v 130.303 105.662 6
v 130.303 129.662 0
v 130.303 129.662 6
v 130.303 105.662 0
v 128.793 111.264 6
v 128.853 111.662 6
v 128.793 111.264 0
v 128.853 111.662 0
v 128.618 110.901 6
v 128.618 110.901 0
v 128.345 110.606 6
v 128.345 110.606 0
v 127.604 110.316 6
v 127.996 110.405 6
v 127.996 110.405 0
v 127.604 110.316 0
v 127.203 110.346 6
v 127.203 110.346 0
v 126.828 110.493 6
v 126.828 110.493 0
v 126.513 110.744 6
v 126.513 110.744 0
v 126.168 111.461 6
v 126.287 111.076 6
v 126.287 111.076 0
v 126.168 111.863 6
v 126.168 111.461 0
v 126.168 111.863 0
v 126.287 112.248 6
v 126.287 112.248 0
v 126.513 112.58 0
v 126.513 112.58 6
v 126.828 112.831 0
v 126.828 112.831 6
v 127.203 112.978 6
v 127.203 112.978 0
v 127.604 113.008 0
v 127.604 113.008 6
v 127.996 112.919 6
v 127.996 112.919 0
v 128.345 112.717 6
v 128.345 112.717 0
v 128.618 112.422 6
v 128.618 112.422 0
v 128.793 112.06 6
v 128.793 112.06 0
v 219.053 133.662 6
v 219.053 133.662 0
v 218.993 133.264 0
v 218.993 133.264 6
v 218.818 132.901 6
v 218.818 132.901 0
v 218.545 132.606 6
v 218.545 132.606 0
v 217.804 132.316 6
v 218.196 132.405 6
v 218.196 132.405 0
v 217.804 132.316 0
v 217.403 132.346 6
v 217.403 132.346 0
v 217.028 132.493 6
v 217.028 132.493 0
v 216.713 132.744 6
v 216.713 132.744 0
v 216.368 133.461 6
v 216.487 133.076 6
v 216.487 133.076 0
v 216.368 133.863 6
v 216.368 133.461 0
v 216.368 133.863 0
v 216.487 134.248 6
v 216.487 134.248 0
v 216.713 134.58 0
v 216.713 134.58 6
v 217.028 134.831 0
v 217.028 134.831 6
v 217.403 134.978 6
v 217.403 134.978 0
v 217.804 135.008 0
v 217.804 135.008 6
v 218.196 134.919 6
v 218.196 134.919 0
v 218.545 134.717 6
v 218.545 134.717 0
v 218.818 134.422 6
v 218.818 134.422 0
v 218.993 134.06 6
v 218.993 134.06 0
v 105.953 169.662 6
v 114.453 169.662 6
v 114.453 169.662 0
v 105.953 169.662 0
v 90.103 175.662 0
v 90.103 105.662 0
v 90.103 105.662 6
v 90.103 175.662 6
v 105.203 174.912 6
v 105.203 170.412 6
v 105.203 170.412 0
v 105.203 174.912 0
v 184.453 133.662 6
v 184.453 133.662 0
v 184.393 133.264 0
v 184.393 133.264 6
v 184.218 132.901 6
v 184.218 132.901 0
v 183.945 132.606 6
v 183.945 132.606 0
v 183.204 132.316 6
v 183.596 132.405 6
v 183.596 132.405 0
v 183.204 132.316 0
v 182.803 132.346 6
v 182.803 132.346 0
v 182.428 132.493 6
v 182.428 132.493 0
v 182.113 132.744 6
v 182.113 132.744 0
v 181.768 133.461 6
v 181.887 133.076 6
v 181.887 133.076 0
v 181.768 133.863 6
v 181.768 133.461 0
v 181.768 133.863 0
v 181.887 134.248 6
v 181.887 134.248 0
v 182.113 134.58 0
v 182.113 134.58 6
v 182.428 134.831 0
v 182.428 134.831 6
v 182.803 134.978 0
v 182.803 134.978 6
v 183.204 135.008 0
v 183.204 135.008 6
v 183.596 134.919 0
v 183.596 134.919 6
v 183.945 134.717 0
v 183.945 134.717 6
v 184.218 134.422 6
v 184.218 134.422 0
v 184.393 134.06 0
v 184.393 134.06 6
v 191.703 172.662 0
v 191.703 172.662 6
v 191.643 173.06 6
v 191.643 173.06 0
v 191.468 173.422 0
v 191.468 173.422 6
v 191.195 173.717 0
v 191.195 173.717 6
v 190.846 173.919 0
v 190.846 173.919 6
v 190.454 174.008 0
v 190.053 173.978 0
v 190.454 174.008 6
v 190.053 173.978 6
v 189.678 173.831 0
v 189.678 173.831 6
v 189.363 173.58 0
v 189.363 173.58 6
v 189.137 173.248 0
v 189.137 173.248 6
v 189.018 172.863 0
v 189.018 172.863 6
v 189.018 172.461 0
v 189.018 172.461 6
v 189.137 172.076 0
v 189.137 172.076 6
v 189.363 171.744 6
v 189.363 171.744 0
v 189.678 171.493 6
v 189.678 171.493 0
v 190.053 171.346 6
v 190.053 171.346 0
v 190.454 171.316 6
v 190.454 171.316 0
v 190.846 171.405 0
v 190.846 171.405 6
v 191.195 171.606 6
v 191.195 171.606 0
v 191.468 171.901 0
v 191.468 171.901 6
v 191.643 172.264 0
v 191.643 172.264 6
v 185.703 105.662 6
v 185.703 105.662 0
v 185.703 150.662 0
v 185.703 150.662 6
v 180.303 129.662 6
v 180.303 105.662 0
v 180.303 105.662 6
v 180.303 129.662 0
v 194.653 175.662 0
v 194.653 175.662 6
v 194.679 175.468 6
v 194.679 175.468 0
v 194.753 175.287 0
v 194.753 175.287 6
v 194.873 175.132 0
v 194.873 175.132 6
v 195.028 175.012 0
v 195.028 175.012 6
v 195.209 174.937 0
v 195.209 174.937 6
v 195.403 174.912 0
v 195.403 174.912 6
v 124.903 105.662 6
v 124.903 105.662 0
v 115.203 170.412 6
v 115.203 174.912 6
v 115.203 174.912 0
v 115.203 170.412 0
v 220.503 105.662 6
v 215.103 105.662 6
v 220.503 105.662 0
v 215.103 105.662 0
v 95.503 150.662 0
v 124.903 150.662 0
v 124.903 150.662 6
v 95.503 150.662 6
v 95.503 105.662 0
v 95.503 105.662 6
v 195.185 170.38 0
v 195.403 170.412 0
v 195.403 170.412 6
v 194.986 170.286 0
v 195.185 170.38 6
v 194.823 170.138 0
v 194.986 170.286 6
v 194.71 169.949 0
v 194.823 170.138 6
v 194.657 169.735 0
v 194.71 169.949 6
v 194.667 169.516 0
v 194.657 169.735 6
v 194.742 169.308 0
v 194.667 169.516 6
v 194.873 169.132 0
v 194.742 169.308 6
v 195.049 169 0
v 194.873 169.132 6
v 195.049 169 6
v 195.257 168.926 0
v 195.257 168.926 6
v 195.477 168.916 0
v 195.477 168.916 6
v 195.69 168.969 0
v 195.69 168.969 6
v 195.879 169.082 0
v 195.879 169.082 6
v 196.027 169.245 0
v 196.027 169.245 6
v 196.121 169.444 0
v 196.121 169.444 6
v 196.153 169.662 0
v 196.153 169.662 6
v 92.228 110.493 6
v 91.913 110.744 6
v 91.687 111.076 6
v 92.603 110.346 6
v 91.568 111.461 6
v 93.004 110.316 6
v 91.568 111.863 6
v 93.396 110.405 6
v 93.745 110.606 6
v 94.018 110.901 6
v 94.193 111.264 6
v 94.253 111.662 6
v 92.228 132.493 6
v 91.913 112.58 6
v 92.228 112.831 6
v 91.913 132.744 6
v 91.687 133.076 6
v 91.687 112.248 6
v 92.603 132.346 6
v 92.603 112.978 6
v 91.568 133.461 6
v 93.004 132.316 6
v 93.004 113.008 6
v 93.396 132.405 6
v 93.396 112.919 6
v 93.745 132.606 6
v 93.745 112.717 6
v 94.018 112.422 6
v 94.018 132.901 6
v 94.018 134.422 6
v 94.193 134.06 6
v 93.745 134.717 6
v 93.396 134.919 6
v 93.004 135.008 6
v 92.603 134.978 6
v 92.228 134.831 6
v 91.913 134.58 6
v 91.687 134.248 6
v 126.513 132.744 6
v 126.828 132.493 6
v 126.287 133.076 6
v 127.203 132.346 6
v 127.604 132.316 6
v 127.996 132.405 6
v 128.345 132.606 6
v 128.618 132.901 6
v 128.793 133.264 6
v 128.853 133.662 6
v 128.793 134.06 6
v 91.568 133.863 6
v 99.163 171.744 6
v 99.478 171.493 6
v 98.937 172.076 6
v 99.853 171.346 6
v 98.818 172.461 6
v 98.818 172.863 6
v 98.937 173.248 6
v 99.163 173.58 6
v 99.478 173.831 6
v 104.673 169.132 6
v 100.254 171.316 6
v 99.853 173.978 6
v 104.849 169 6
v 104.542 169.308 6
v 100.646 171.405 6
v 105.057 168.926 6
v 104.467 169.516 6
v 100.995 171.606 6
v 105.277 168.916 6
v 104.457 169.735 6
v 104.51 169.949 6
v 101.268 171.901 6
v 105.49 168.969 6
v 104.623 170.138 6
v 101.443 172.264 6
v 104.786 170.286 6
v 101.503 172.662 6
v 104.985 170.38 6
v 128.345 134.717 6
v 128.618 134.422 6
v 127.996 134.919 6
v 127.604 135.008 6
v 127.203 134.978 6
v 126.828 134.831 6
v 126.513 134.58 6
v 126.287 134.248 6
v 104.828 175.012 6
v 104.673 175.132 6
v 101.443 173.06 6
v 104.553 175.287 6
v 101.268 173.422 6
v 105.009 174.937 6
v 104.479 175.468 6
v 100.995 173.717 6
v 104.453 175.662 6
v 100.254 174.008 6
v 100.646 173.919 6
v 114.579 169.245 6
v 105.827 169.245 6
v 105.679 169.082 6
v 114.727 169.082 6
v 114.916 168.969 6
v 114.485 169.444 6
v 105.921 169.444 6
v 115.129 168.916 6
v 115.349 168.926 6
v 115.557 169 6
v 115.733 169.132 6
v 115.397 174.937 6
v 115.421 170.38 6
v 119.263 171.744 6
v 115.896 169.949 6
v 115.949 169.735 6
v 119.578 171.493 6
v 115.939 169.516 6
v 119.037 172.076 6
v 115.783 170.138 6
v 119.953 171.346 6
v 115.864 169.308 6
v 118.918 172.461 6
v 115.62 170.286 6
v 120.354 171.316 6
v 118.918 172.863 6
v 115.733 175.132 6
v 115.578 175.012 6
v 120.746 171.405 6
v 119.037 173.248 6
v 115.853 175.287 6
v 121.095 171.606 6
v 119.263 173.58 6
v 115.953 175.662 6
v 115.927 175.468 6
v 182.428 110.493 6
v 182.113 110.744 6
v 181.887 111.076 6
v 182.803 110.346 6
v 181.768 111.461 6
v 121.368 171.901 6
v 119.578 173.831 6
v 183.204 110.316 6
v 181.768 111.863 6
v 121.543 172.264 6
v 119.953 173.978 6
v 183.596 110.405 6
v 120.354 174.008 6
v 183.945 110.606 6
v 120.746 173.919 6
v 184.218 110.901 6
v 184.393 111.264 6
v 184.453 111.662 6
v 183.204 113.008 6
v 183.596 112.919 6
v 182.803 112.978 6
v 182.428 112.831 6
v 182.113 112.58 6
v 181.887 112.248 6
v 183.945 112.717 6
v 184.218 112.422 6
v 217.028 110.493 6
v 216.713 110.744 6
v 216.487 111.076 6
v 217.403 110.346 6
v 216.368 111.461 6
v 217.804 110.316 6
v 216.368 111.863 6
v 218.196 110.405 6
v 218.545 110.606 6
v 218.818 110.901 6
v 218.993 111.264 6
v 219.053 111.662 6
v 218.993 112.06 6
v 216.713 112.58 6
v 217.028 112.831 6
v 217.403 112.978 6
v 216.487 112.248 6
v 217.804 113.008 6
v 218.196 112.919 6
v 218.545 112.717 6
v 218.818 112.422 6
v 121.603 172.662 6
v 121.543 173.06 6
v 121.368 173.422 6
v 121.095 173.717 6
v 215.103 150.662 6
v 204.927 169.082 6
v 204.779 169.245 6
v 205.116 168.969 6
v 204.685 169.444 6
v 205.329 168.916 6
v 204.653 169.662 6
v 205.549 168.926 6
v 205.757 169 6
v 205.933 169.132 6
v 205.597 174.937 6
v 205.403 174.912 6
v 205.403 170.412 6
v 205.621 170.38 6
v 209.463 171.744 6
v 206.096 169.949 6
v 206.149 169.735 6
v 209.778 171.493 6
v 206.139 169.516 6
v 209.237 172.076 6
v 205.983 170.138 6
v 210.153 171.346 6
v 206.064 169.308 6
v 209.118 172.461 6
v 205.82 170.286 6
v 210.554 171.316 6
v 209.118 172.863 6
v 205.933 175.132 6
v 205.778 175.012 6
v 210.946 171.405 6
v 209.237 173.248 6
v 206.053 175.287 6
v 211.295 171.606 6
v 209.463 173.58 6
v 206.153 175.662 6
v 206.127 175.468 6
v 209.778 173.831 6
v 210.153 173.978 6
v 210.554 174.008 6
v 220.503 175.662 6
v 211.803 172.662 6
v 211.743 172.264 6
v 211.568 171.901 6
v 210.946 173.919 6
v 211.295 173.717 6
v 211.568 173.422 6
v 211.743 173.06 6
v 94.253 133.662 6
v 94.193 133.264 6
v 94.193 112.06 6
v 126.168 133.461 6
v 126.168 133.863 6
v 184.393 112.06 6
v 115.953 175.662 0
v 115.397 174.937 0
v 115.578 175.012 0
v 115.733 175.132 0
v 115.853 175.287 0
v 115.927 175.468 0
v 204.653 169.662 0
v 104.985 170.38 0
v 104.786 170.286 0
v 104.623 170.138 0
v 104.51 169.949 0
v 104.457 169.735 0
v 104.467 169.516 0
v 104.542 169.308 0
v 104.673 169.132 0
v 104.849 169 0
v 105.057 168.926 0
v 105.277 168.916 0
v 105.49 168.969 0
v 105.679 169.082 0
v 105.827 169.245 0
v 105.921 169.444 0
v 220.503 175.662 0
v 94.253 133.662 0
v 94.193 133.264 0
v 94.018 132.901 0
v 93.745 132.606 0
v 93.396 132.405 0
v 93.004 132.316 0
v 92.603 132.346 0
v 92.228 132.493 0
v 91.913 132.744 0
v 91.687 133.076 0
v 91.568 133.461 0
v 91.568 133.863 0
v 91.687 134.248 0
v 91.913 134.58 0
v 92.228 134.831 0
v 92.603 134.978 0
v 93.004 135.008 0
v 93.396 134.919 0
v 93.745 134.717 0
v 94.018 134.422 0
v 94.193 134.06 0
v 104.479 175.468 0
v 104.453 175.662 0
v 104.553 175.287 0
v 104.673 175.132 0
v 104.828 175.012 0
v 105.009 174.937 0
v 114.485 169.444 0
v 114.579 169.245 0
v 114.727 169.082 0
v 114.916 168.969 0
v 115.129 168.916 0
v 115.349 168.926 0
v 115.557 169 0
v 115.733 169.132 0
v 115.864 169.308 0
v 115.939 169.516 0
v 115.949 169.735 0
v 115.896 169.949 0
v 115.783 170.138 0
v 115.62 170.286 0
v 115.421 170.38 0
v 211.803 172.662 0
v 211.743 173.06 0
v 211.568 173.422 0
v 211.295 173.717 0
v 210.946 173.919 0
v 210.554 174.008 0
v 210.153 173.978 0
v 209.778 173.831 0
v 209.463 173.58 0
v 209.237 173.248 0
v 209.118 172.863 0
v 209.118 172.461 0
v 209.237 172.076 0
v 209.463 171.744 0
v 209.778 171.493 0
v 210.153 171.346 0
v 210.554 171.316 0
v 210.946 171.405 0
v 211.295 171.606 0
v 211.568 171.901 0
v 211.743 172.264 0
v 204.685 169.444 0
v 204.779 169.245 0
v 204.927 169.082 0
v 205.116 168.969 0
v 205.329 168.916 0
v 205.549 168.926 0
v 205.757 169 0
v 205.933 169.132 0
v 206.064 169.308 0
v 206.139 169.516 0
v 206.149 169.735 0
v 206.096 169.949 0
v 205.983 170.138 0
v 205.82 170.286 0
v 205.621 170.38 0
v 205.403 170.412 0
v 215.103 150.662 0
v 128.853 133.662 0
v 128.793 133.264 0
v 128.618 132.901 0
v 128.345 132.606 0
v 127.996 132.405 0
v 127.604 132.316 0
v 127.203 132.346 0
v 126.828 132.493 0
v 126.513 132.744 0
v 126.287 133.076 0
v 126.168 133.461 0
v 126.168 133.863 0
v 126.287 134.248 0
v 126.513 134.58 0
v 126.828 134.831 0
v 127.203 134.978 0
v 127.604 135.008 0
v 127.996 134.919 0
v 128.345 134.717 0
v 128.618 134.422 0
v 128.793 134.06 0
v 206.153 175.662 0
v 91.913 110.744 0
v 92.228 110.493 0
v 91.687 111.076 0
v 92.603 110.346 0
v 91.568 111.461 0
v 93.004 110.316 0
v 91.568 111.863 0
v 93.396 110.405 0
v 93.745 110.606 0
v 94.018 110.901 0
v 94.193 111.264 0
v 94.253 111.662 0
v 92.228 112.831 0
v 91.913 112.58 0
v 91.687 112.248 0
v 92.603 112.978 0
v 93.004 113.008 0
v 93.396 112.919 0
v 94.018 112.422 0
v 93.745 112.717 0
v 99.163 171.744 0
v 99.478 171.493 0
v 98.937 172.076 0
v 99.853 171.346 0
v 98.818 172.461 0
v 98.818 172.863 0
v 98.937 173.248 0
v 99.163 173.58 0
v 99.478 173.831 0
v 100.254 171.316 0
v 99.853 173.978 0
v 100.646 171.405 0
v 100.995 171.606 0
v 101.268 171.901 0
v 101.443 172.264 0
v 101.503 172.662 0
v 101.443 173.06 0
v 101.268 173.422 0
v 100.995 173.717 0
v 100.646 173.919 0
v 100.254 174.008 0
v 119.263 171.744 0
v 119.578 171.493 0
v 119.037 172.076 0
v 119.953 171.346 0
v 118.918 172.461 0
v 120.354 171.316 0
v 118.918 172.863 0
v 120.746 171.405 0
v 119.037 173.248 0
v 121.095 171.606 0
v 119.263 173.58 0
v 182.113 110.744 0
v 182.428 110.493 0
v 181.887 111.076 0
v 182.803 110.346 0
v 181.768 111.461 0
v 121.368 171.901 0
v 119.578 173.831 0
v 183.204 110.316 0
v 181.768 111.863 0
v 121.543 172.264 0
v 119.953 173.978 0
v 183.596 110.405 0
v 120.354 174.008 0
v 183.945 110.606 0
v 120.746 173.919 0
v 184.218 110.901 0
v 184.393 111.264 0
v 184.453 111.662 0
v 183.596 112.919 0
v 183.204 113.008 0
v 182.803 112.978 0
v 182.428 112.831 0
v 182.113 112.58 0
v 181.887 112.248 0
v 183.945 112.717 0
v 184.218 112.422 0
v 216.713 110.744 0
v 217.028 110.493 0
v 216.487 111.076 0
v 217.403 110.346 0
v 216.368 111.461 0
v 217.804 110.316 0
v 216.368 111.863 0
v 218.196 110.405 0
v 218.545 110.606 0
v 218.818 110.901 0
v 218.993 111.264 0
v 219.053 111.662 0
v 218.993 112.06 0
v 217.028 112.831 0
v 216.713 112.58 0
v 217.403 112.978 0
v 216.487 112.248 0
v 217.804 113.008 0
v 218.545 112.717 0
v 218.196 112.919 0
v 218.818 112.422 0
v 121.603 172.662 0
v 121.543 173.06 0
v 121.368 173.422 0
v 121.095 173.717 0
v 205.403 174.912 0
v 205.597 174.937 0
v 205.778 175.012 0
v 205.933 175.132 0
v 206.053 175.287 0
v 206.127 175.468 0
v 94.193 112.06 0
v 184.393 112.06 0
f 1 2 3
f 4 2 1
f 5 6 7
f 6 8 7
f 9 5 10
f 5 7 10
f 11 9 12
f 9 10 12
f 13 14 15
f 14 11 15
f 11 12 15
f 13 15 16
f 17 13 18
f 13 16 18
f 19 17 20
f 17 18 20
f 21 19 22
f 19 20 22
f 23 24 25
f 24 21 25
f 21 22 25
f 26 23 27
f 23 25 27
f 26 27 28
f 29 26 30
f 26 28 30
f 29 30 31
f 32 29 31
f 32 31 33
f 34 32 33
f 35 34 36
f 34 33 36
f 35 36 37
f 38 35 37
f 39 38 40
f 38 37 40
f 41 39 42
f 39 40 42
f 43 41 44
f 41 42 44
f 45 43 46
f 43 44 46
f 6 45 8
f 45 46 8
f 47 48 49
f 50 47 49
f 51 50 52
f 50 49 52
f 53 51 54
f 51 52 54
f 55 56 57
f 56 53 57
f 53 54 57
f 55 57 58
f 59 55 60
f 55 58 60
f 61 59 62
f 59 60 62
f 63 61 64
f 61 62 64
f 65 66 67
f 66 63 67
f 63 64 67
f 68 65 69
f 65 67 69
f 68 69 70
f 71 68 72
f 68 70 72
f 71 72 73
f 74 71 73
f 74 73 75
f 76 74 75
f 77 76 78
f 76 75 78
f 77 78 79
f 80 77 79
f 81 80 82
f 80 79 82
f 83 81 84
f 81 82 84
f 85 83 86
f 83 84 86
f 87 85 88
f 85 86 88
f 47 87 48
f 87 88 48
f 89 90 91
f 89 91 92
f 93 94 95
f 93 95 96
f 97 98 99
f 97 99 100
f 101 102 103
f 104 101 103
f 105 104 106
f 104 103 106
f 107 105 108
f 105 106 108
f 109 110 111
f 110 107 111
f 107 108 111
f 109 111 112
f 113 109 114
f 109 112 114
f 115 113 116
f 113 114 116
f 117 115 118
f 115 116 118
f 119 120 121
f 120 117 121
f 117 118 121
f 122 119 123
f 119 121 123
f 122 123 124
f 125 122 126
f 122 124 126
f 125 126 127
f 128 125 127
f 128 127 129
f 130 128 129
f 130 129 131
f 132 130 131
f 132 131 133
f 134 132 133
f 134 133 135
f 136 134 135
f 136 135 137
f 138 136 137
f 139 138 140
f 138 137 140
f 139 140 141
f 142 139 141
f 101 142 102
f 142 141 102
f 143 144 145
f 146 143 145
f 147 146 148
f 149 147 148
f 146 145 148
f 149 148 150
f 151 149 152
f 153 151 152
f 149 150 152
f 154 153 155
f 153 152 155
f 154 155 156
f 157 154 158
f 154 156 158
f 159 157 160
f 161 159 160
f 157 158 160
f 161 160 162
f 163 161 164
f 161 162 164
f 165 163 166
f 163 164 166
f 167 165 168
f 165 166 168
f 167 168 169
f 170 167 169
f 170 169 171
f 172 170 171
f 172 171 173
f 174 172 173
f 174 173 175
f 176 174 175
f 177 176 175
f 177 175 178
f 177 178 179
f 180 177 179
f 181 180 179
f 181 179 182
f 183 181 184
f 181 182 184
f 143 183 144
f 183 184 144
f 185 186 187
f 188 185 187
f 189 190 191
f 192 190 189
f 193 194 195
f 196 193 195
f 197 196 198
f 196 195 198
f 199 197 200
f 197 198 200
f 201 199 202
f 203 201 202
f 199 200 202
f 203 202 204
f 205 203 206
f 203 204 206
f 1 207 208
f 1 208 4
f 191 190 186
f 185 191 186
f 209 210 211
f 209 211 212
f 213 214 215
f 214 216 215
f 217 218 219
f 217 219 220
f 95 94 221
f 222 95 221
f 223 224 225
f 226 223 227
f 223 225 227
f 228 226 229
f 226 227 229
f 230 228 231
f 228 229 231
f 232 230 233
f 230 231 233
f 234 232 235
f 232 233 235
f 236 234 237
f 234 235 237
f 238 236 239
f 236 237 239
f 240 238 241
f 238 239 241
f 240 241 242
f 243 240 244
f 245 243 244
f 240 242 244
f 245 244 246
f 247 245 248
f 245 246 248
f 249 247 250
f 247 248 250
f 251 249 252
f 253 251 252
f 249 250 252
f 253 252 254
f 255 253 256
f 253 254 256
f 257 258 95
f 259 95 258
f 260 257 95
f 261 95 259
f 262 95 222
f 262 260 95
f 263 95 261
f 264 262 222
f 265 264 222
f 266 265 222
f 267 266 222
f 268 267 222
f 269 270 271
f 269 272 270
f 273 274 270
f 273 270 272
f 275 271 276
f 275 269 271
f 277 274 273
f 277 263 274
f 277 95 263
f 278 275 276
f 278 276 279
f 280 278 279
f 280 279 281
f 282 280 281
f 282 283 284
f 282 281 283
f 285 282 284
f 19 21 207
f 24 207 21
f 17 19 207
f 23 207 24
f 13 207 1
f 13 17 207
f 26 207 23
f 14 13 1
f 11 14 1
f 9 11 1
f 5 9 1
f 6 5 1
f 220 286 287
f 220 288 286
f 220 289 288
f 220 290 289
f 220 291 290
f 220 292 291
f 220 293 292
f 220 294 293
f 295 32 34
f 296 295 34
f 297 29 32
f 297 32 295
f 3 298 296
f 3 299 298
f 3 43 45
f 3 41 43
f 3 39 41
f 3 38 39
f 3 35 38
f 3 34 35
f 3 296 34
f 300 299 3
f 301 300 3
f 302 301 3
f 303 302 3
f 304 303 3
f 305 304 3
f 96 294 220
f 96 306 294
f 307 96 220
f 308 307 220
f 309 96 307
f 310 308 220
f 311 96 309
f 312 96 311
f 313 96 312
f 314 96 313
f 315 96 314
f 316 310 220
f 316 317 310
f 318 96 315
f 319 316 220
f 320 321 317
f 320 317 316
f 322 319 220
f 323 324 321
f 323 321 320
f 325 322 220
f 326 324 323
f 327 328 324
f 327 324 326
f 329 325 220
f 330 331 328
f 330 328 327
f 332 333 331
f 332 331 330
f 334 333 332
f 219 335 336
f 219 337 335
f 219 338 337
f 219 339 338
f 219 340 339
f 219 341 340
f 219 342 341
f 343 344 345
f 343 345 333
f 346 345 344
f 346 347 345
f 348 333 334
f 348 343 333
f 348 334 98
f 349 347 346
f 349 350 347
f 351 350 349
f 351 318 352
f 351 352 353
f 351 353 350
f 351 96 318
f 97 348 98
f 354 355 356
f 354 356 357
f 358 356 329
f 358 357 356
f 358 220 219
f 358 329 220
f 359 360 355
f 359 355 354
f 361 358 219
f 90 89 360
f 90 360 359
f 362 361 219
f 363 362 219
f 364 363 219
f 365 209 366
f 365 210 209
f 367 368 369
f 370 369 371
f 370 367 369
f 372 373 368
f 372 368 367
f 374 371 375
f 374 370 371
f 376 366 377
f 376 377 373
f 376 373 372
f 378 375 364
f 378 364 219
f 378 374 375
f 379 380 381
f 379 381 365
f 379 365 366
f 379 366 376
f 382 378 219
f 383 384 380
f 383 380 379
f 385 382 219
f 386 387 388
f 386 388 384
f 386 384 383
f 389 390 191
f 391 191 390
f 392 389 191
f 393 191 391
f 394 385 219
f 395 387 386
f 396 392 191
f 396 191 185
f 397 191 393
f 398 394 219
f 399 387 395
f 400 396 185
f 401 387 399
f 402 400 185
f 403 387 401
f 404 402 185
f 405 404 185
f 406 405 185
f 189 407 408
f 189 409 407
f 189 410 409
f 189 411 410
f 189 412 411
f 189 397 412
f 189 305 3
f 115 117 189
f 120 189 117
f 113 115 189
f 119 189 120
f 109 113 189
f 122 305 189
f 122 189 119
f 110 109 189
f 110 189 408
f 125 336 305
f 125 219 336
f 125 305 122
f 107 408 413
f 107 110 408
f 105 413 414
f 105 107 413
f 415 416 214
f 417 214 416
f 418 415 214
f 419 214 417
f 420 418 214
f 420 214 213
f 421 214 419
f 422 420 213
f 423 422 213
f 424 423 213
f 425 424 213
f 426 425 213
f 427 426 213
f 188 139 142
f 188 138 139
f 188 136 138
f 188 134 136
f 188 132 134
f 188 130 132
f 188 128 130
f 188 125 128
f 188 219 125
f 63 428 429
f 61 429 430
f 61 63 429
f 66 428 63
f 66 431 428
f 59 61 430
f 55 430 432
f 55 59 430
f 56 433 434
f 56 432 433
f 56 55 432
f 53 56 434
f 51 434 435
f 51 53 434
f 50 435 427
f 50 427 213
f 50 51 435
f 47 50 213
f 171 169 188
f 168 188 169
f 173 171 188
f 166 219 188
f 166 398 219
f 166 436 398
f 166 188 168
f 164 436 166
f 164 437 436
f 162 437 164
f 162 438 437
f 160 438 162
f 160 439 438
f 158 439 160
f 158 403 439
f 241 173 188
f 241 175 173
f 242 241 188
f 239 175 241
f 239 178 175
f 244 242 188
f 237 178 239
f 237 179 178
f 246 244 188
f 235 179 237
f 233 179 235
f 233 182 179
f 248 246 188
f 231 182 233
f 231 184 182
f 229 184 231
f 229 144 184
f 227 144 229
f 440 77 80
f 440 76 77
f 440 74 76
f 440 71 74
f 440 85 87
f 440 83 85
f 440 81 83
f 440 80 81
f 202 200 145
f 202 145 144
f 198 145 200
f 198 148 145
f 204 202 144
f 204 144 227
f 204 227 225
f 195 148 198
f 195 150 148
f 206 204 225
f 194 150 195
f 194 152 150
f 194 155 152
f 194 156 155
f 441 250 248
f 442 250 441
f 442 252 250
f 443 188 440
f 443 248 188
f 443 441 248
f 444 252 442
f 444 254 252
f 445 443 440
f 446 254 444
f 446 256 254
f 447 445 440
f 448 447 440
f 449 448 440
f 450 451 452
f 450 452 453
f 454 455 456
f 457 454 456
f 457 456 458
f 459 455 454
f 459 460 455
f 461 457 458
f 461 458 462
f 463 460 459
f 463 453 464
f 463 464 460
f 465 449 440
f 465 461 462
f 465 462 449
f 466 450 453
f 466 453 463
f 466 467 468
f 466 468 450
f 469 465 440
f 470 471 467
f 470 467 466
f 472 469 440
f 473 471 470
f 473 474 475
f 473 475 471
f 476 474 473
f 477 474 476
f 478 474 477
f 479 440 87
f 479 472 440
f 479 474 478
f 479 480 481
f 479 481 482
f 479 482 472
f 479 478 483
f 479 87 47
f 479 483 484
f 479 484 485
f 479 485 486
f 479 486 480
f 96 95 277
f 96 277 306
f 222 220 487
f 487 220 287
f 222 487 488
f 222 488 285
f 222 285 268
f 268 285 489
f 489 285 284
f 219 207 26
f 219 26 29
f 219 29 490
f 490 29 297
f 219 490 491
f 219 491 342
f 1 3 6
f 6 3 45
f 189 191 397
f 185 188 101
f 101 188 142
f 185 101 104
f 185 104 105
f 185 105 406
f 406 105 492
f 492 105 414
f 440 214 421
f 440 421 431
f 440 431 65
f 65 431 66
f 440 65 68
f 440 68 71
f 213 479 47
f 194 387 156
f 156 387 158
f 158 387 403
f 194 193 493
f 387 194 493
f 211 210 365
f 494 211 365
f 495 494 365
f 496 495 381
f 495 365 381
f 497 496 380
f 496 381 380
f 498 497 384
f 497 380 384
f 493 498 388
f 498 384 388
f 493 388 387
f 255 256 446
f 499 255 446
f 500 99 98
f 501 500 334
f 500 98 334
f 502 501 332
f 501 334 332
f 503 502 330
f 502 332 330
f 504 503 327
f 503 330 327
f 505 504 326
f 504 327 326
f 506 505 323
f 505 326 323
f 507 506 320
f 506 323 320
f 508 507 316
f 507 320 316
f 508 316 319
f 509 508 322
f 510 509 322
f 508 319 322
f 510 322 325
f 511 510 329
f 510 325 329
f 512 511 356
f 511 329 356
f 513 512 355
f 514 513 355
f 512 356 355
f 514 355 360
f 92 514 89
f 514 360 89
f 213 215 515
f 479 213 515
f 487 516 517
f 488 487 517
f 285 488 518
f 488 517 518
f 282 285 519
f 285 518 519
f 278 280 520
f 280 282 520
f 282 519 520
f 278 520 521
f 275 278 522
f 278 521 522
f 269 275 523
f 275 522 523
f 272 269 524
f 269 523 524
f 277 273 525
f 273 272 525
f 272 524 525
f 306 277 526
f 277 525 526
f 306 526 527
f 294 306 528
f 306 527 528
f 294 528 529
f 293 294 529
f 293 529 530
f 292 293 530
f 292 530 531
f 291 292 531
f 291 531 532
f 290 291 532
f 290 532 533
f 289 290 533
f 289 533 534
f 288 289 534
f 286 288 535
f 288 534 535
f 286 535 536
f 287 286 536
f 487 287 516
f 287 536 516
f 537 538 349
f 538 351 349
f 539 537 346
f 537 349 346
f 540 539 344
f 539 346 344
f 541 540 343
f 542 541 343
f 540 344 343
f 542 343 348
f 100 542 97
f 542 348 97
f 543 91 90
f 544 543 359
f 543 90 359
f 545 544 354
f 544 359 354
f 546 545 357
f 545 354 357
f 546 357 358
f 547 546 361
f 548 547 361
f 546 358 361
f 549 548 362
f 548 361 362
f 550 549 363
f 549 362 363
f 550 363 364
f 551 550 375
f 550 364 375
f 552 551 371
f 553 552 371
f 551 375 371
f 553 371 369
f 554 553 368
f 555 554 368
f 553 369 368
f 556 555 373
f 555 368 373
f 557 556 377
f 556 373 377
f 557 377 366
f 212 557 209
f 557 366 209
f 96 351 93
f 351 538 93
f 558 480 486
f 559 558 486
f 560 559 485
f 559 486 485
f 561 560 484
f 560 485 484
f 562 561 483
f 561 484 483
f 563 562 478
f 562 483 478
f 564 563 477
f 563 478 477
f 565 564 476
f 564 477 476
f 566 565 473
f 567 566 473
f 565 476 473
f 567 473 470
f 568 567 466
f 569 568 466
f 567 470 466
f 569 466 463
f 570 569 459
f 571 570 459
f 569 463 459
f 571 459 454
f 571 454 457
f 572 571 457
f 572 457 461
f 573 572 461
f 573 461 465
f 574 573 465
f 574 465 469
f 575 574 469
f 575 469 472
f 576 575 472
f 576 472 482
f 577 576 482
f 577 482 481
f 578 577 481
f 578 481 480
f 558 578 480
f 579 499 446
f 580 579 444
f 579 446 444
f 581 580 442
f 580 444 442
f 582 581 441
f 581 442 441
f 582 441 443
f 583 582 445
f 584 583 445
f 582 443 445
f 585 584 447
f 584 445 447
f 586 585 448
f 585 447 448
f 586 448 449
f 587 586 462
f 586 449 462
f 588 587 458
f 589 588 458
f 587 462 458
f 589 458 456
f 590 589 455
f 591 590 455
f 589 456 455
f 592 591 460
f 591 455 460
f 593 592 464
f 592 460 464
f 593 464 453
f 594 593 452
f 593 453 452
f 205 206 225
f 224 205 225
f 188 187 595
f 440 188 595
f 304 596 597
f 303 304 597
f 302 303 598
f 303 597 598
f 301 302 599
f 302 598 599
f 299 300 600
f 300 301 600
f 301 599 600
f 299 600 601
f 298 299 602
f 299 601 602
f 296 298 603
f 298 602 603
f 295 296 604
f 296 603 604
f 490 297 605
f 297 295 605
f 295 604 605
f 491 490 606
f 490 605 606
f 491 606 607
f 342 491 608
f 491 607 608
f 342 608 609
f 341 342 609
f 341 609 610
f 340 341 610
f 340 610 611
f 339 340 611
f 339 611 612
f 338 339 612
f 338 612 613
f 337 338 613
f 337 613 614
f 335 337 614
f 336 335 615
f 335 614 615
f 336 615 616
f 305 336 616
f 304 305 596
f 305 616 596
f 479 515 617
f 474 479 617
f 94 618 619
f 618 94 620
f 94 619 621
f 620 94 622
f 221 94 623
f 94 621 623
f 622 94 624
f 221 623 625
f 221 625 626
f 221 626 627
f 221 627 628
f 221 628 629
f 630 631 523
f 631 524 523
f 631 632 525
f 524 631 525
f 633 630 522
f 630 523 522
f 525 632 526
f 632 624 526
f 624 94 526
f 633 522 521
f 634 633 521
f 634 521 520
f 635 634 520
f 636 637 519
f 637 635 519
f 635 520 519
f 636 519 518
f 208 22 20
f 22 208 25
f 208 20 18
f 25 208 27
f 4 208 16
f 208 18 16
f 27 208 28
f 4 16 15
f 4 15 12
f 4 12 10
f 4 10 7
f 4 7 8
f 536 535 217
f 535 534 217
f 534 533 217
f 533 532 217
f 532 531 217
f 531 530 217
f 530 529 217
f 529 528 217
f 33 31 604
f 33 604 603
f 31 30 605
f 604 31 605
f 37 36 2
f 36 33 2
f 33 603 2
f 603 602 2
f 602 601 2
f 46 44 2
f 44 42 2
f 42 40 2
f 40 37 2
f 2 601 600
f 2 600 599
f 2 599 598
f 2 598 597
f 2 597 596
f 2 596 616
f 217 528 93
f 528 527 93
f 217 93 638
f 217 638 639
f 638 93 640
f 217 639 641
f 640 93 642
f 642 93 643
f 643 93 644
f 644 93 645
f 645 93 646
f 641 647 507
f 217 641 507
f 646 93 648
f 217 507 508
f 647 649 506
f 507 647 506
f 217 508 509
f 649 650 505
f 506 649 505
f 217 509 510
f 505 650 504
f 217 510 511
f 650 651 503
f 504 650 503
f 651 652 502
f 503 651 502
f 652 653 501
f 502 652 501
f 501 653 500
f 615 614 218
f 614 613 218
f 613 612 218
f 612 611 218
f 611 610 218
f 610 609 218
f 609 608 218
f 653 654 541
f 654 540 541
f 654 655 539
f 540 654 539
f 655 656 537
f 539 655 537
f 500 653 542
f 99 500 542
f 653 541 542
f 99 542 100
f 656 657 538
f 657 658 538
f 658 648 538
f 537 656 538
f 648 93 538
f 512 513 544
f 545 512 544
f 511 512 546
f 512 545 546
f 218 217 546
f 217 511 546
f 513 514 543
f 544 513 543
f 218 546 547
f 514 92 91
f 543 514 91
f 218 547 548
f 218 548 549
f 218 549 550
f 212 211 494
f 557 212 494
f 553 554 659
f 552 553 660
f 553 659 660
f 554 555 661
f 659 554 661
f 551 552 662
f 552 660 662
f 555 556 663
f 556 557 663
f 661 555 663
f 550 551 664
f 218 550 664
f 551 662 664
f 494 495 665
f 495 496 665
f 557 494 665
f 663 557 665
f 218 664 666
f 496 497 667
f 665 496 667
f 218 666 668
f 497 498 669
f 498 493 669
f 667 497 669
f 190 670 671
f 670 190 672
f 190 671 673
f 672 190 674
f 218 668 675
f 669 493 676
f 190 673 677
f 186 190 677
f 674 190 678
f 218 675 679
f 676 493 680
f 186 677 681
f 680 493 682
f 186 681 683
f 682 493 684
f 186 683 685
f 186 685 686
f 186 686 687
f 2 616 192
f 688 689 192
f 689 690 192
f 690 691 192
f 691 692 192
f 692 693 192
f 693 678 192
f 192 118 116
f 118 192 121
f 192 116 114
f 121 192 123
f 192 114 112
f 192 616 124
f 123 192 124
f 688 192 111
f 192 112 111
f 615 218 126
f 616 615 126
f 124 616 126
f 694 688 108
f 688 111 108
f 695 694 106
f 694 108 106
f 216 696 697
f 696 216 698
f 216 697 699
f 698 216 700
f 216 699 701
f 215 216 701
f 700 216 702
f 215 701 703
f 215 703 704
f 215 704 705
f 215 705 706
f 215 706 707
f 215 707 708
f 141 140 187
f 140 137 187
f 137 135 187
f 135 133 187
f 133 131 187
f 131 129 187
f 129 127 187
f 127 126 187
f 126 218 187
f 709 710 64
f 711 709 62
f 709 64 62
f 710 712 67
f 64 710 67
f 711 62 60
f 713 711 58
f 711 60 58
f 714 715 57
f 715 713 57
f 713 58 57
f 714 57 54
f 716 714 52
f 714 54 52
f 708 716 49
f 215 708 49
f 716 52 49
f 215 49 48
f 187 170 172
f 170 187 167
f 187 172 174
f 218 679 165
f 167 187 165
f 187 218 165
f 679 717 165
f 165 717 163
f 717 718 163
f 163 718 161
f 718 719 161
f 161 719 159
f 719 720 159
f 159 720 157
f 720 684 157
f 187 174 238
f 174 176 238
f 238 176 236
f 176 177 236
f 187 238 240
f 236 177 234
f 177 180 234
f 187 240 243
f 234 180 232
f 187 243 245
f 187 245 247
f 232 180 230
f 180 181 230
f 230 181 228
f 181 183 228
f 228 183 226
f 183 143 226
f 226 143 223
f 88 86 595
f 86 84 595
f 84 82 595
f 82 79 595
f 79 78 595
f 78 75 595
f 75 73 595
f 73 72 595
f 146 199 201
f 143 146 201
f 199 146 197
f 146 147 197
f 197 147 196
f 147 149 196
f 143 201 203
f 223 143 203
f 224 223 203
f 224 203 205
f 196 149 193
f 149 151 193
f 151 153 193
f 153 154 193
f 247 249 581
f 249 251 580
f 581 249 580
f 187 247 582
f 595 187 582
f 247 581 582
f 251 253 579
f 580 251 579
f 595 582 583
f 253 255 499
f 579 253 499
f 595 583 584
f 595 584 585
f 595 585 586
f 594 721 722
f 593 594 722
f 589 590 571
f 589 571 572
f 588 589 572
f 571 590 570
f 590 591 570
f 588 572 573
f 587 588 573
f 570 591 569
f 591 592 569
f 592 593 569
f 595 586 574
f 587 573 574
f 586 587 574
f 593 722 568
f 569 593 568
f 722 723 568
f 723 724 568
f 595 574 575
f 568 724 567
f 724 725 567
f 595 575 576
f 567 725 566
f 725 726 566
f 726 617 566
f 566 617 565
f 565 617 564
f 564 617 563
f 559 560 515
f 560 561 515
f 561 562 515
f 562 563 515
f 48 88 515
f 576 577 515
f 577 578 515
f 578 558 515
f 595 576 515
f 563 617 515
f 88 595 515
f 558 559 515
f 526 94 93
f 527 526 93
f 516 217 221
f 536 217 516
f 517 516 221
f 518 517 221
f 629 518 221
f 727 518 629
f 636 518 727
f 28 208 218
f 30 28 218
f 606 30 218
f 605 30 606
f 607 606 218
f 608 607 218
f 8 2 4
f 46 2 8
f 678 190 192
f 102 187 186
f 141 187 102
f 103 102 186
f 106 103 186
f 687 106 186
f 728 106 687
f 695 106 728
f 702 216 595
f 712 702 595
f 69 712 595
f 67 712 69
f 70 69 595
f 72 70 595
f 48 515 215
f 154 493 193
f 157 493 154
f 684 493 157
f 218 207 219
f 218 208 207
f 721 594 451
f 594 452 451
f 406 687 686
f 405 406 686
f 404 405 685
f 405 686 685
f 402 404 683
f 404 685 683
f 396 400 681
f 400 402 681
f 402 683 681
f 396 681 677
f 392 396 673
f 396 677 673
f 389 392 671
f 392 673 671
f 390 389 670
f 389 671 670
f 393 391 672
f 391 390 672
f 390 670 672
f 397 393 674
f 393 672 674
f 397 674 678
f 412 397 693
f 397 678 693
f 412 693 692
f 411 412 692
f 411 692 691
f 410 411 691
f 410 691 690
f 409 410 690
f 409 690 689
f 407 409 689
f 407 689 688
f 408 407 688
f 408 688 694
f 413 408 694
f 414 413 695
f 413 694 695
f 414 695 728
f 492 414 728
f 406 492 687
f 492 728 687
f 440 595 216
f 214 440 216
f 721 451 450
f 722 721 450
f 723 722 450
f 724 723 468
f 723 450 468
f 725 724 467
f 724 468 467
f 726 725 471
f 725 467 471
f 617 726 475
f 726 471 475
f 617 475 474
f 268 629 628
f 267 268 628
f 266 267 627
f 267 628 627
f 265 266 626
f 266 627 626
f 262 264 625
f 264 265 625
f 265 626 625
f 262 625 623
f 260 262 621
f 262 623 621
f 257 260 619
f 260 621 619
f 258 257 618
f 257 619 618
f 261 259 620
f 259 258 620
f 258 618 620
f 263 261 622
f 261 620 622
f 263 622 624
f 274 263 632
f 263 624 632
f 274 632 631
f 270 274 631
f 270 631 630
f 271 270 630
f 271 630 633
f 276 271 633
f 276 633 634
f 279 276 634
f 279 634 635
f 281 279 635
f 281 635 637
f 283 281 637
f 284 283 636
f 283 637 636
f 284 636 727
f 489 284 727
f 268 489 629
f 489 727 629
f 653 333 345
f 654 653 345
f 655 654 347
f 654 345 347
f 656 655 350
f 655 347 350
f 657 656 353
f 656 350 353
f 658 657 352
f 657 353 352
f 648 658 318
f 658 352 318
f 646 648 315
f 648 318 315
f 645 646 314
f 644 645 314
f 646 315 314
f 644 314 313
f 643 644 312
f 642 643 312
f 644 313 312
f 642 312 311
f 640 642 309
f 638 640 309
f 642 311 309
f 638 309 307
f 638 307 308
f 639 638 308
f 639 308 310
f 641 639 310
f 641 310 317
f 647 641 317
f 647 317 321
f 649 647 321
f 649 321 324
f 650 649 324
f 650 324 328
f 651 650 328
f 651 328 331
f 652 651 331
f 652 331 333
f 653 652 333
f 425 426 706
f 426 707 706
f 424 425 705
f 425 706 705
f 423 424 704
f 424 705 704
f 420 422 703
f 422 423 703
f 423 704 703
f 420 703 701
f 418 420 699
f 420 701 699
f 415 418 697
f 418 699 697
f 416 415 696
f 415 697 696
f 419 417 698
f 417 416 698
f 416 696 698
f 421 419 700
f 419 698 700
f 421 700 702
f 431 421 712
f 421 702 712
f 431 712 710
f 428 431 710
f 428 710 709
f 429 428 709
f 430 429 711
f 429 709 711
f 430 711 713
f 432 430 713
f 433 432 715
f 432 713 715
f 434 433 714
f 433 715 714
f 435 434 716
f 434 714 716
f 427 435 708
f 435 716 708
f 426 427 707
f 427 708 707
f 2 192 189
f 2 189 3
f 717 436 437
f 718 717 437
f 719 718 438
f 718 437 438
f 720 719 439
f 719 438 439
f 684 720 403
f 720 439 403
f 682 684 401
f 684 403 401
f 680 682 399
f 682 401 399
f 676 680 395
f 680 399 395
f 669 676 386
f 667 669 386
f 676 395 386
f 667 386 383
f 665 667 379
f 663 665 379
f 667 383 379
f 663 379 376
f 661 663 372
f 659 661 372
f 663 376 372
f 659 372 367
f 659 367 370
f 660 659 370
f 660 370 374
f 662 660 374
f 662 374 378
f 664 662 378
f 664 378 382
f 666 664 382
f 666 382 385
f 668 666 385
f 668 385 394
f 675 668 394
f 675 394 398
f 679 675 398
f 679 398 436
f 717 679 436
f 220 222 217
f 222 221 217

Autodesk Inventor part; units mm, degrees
ref_plane "YZ Plane" through (0, 0, 0) normal (1, 0, 0) x (0, 1, 0)
ref_plane "XZ Plane" through (0, 0, 0) normal (0, 1, 0) x (-1, 0, 0)
ref_plane "XY Plane" through (0, 0, 0) normal (0, 0, 1) x (1, 0, 0)
sketch "스케치1" plane through (0, 0, 0) normal (0, 0, 1) x (1, 0, 0)
  arc A0 (90.6223, 135.9255) -> (90.103, 134.2386) centre (93.103, 134.2386) ccw
  line L0 (90.103, 89.9853) -> (90.103, 134.2386)
  arc A1 (90.103, 89.9853) -> (90.6223, 88.2984) centre (93.103, 89.9853) ccw
  line L1 (94.3102, 82.875) -> (90.6223, 88.2984)
  arc A2 (94.3102, 82.875) -> (96.7909, 81.5619) centre (96.7909, 84.5619) ccw
  line L2 (123.6151, 81.5619) -> (96.7909, 81.5619)
  arc A3 (123.6151, 81.5619) -> (126.0959, 82.875) centre (123.6151, 84.5619) ccw
  line L3 (129.7838, 88.2984) -> (126.0959, 82.875)
  arc A4 (129.7838, 88.2984) -> (130.303, 89.9853) centre (127.303, 89.9853) ccw
  line L4 (130.303, 134.2386) -> (130.303, 89.9853)
  arc A5 (130.303, 134.2386) -> (129.7838, 135.9255) centre (127.303, 134.2386) ccw
  line L5 (125.7983, 141.7866) -> (129.7838, 135.9255)
  arc A6 (125.7983, 141.7866) -> (124.1444, 142.6619) centre (124.1444, 140.6619) ccw
  line L6 (117.853, 142.6619) -> (124.1444, 142.6619)
  arc A7 (119.353, 141.1619) -> (117.853, 142.6619) centre (117.853, 141.1619) ccw
  arc A8 (124.703, 136.3119) -> (123.703, 137.3119) centre (123.703, 136.3119) ccw
  line L7 (118.353, 87.1619) -> (102.053, 87.1619)
  line L8 (96.2616, 142.6619) -> (102.553, 142.6619)
  arc A9 (96.2616, 142.6619) -> (94.6078, 141.7866) centre (96.2616, 140.6619) ccw
  line L9 (90.6223, 135.9255) -> (94.6078, 141.7866)
  circle A10 centre (127.503, 133.6619) radius 1.35
  circle A11 centre (127.503, 111.6619) radius 1.35
  circle A12 centre (121.203, 84.3619) radius 1.35
  circle A13 centre (92.903, 133.6619) radius 1.35
  circle A14 centre (92.903, 111.6619) radius 1.35
  circle A15 centre (99.203, 84.3619) radius 1.35
  circle A16 centre (127.503, 89.6619) radius 1.35
  circle A17 centre (92.903, 89.6619) radius 1.35
  arc A18 (180.8223, 135.9255) -> (180.303, 134.2386) centre (183.303, 134.2386) ccw
  line L10 (180.303, 89.9853) -> (180.303, 134.2386)
  arc A19 (180.303, 89.9853) -> (180.8223, 88.2984) centre (183.303, 89.9853) ccw
  line L11 (184.5102, 82.875) -> (180.8223, 88.2984)
  arc A20 (184.5102, 82.875) -> (186.9909, 81.5619) centre (186.9909, 84.5619) ccw
  line L12 (213.8151, 81.5619) -> (186.9909, 81.5619)
  arc A21 (213.8151, 81.5619) -> (216.2959, 82.875) centre (213.8151, 84.5619) ccw
  line L13 (219.9838, 88.2984) -> (216.2959, 82.875)
  arc A22 (219.9838, 88.2984) -> (220.503, 89.9853) centre (217.503, 89.9853) ccw
  line L14 (220.503, 134.2386) -> (220.503, 89.9853)
  arc A23 (220.503, 134.2386) -> (219.9838, 135.9255) centre (217.503, 134.2386) ccw
  line L15 (215.9983, 141.7866) -> (219.9838, 135.9255)
  arc A24 (215.9983, 141.7866) -> (214.3444, 142.6619) centre (214.3444, 140.6619) ccw
  line L16 (208.053, 142.6619) -> (214.3444, 142.6619)
  arc A25 (209.553, 141.1619) -> (208.053, 142.6619) centre (208.053, 141.1619) ccw
  line L17 (211.903, 137.3119) -> (213.903, 137.3119)
  arc A26 (214.903, 136.3119) -> (213.903, 137.3119) centre (213.903, 136.3119) ccw
  line L18 (208.553, 87.1619) -> (192.253, 87.1619)
  arc A27 (186.903, 137.3119) -> (185.903, 136.3119) centre (186.903, 136.3119) ccw
  arc A28 (192.753, 142.6619) -> (191.253, 141.1619) centre (192.753, 141.1619) ccw
  line L19 (186.4616, 142.6619) -> (192.753, 142.6619)
  arc A29 (186.4616, 142.6619) -> (184.8078, 141.7866) centre (186.4616, 140.6619) ccw
  line L20 (180.8223, 135.9255) -> (184.8078, 141.7866)
  circle A30 centre (217.703, 133.6619) radius 1.35
  circle A31 centre (217.703, 111.6619) radius 1.35
  circle A32 centre (211.403, 84.3619) radius 1.35
  circle A33 centre (183.103, 133.6619) radius 1.35
  circle A34 centre (183.103, 111.6619) radius 1.35
  circle A35 centre (189.403, 84.3619) radius 1.35
  circle A36 centre (217.703, 89.6619) radius 1.35
  circle A37 centre (183.103, 89.6619) radius 1.35
  circle A38 centre (200.403, 129.6619) radius 4.5766
  line L21 (95.503, 93.5119) -> (95.503, 136.3119)
  line L22 (124.903, 93.5119) -> (124.903, 136.3119)
  arc A39 (124.903, 136.3119) -> (123.703, 137.5119) centre (123.703, 136.3119) ccw
  line L23 (185.703, 93.5119) -> (185.703, 136.3119)
  arc A40 (186.903, 137.5119) -> (185.703, 136.3119) centre (186.903, 136.3119) ccw
  line L24 (215.103, 93.5119) -> (215.103, 136.3119)
  arc A41 (215.103, 136.3119) -> (213.903, 137.5119) centre (213.903, 136.3119) ccw
  line L25 (213.903, 137.5119) -> (211.903, 137.5119)
  line L26 (90.103, 129.6619) -> (90.103, 105.6619)
  line L27 (90.103, 105.6619) -> (220.503, 105.6619)
  line L28 (220.503, 105.6619) -> (220.503, 129.6619)
  line L29 (220.503, 129.6619) -> (90.103, 129.6619)
  line L30 (90.103, 129.6619) -> (90.103, 105.6619)
  line L31 (90.103, 129.6619) -> (220.503, 129.6619)
  line L32 (220.503, 129.6619) -> (220.503, 175.6619)
  line L33 (220.503, 175.6619) -> (90.103, 175.6619)
  line L34 (90.103, 175.6619) -> (90.103, 129.6619)
  line L35 (95.503, 140.6619) -> (215.103, 140.6619)
  line L36 (215.103, 140.6619) -> (215.103, 129.6619)
  line L37 (185.703, 129.6619) -> (185.703, 140.6619)
  line L38 (124.903, 129.6619) -> (124.903, 140.6619)
  line L39 (95.503, 129.6619) -> (95.503, 140.6619)
  line L40 (95.503, 140.6619) -> (95.503, 150.6619)
  line L41 (124.903, 140.6619) -> (124.903, 150.6619)
  line L42 (124.903, 150.6619) -> (95.503, 150.6619)
  line L43 (185.703, 140.6619) -> (185.703, 150.6619)
  line L44 (185.703, 150.6619) -> (215.103, 150.6619)
  line L45 (215.103, 150.6619) -> (215.103, 140.6619)
  point P0 (110.203, 129.6619)
  point P1 (90.103, 134.2386)
  point P2 (95.503, 105.6619)
  point P3 (124.903, 105.6619)
  point P4 (130.303, 105.6619)
  point P5 (130.303, 129.6619)
  point P6 (180.303, 129.6619)
  point P7 (180.303, 105.6619)
  point P8 (185.703, 105.6619)
  point P9 (215.103, 129.6619)
  point P10 (215.103, 105.6619)
  dimension "d18" = 24
  dimension "d19" = 46
  dimension "d33" = 10
extrude "돌출2" add sketch "스케치1" along normal blind 6 contours L9 A9 L40 L39 L21 L29 L0 A0 | A0 L34 L33 L32 A23 L15 A24 L45 L44 L43 A29 L20 L35 L5 A6 L41 L42 L40 A9 L9 | L29 L21 L27 L0 | L29 L4 L27 L22 | L22 L38 L35 L5 A5 L4 L29 | L14 L29 L24 L36 L45 A24 L15 A23 | L41 A6 L5 L35 | L4 A5 L5 L35 L20 A18 L10 L29 | L14 L27 L24 L29 | L29 L23 L27 L10 | L10 A18 L20 L35 L37 L23 L29 | L20 A29 L43 L35
sketch "스케치2" plane through (0, 0, 6) normal (0, 0, 1) x (1, 0, 0)
  line L0 (220.503, 175.6619) -> (90.103, 175.6619) projected
  line L1 (90.103, 175.6619) -> (90.103, 105.6619) projected
  line L2 (90.103, 105.6619) -> (95.503, 105.6619) projected
  line L3 (95.503, 105.6619) -> (95.503, 150.6619) projected
  line L4 (124.903, 150.6619) -> (124.903, 105.6619) projected
  line L5 (124.903, 105.6619) -> (130.303, 105.6619) projected
  line L6 (130.303, 105.6619) -> (130.303, 129.6619) projected
  line L7 (130.303, 129.6619) -> (180.303, 129.6619) projected
  line L8 (180.303, 129.6619) -> (180.303, 105.6619) projected
  line L9 (180.303, 105.6619) -> (185.703, 105.6619) projected
  line L10 (185.703, 105.6619) -> (185.703, 150.6619) projected
  line L11 (215.103, 150.6619) -> (215.103, 105.6619) projected
  line L12 (215.103, 105.6619) -> (220.503, 105.6619) projected
  line L13 (220.503, 105.6619) -> (220.503, 175.6619) projected
  circle A0 centre (127.503, 111.6619) radius 1.35 projected
  circle A1 centre (217.703, 111.6619) radius 1.35 projected
  circle A2 centre (127.503, 133.6619) radius 1.35 projected
  circle A3 centre (183.103, 133.6619) radius 1.35 projected
  circle A4 centre (183.103, 111.6619) radius 1.35 projected
  circle A5 centre (217.703, 133.6619) radius 1.35 projected
  circle A6 centre (92.903, 133.6619) radius 1.35 projected
  circle A7 centre (92.903, 111.6619) radius 1.35 projected
  line L14 (90.103, 175.6619) -> (220.503, 175.6619)
  line L15 (220.503, 175.6619) -> (220.503, 169.6619)
  line L16 (220.503, 169.6619) -> (90.103, 169.6619)
  line L17 (90.103, 169.6619) -> (90.103, 175.6619)
  line L18 (90.103, 172.6619) -> (100.153, 172.6619)
  line L19 (100.153, 172.6619) -> (120.253, 172.6619)
  line L20 (220.503, 172.6619) -> (210.453, 172.6619)
  line L21 (210.453, 172.6619) -> (190.353, 172.6619)
  circle A8 centre (100.153, 172.6619) radius 1.35
  circle A9 centre (120.253, 172.6619) radius 1.35
  circle A10 centre (190.353, 172.6619) radius 1.35
  circle A11 centre (210.453, 172.6619) radius 1.35
  line L22 (95.503, 150.6619) -> (124.903, 150.6619) projected
  line L23 (185.703, 150.6619) -> (215.103, 150.6619) projected
  point P0 (0, 0)
  dimension "d22" = 6
  dimension "d23" = 10.05
  dimension "d24" = 20.1
  dimension "d25" = 10.05
  dimension "d26" = 20.1
  dimension "d27" = 2.7
  dimension "d28" = 2.7
  dimension "d29" = 2.7
  dimension "d30" = 2.7
extrude "돌출3" cut sketch "스케치2" against normal blind 6 contours A9 | A8 L19 L18 | L18 L19 A8 | A10 | A11 L21 L20 | L20 L21 A11
sketch "스케치3" plane through (0, 0, 6) normal (0, 0, 1) x (1, 0, 0)
  circle A0 centre (120.253, 172.6619) radius 1.35 projected
  circle A1 centre (190.353, 172.6619) radius 1.35 projected
  circle A2 centre (100.153, 172.6619) radius 1.35 projected
  circle A3 centre (210.453, 172.6619) radius 1.35 projected
  line L0 (95.503, 150.6619) -> (124.903, 150.6619) projected
  line L1 (124.903, 150.6619) -> (124.903, 105.6619) projected
  line L2 (124.903, 105.6619) -> (130.303, 105.6619) projected
  line L3 (130.303, 105.6619) -> (130.303, 129.6619) projected
  line L4 (130.303, 129.6619) -> (180.303, 129.6619) projected
  line L5 (180.303, 129.6619) -> (180.303, 105.6619) projected
  line L6 (180.303, 105.6619) -> (185.703, 105.6619) projected
  line L7 (185.703, 105.6619) -> (185.703, 150.6619) projected
  line L8 (185.703, 150.6619) -> (215.103, 150.6619) projected
  line L9 (215.103, 150.6619) -> (215.103, 105.6619) projected
  line L10 (215.103, 105.6619) -> (220.503, 105.6619) projected
  line L11 (220.503, 105.6619) -> (220.503, 175.6619) projected
  line L12 (220.503, 175.6619) -> (90.103, 175.6619) projected
  line L13 (90.103, 175.6619) -> (90.103, 105.6619) projected
  line L14 (90.103, 105.6619) -> (95.503, 105.6619) projected
  line L15 (95.503, 105.6619) -> (95.503, 150.6619) projected
  circle A4 centre (127.503, 111.6619) radius 1.35 projected
  circle A5 centre (92.903, 111.6619) radius 1.35 projected
  circle A6 centre (92.903, 133.6619) radius 1.35 projected
  circle A7 centre (217.703, 111.6619) radius 1.35 projected
  circle A8 centre (217.703, 133.6619) radius 1.35 projected
  circle A9 centre (183.103, 111.6619) radius 1.35 projected
  circle A10 centre (183.103, 133.6619) radius 1.35 projected
  circle A11 centre (127.503, 133.6619) radius 1.35 projected
  line L16 (105.203, 169.6619) -> (105.203, 175.6619)
  line L17 (105.203, 175.6619) -> (115.203, 175.6619)
  line L18 (115.203, 175.6619) -> (115.203, 169.6619)
  line L19 (115.203, 169.6619) -> (105.203, 169.6619)
  line L20 (105.203, 169.6619) -> (115.203, 175.6619) construction
  line L21 (105.203, 175.6619) -> (115.203, 169.6619) construction
  line L22 (205.403, 169.6619) -> (205.403, 175.6619)
  line L23 (205.403, 175.6619) -> (195.403, 175.6619)
  line L24 (195.403, 175.6619) -> (195.403, 169.6619)
  line L25 (195.403, 169.6619) -> (205.403, 169.6619)
  line L26 (205.403, 169.6619) -> (195.403, 175.6619) construction
  line L27 (205.403, 175.6619) -> (195.403, 169.6619) construction
  point P0 (0, 0)
  point P1 (110.203, 172.6619)
  point P2 (200.403, 172.6619)
  dimension "d34" = 10
  dimension "d35" = 10
extrude "돌출4" cut sketch "스케치3" against normal blind 6 contours L12 L18 L19 L16 | L12 L22 L25 L24
sketch "스케치4" plane through (0, 0, 6) normal (0, 0, 1) x (1, 0, 0)
  line L0 (195.403, 169.6619) -> (195.403, 175.6619) projected
  line L1 (195.403, 175.6619) -> (115.203, 175.6619) projected
  line L2 (115.203, 175.6619) -> (115.203, 169.6619) projected
  line L3 (115.203, 169.6619) -> (105.203, 169.6619) projected
  line L4 (105.203, 169.6619) -> (105.203, 175.6619) projected
  line L5 (105.203, 175.6619) -> (90.103, 175.6619) projected
  line L6 (90.103, 175.6619) -> (90.103, 105.6619) projected
  line L7 (90.103, 105.6619) -> (95.503, 105.6619) projected
  line L8 (95.503, 105.6619) -> (95.503, 150.6619) projected
  line L9 (95.503, 150.6619) -> (124.903, 150.6619) projected
  line L10 (124.903, 150.6619) -> (124.903, 105.6619) projected
  line L11 (124.903, 105.6619) -> (130.303, 105.6619) projected
  line L12 (130.303, 105.6619) -> (130.303, 129.6619) projected
  line L13 (130.303, 129.6619) -> (180.303, 129.6619) projected
  line L14 (180.303, 129.6619) -> (180.303, 105.6619) projected
  line L15 (180.303, 105.6619) -> (185.703, 105.6619) projected
  line L16 (185.703, 105.6619) -> (185.703, 150.6619) projected
  line L17 (185.703, 150.6619) -> (215.103, 150.6619) projected
  line L18 (215.103, 150.6619) -> (215.103, 105.6619) projected
  line L19 (215.103, 105.6619) -> (220.503, 105.6619) projected
  line L20 (220.503, 105.6619) -> (220.503, 175.6619) projected
  line L21 (220.503, 175.6619) -> (205.403, 175.6619) projected
  line L22 (205.403, 175.6619) -> (205.403, 169.6619) projected
  line L23 (205.403, 169.6619) -> (195.403, 169.6619) projected
  circle A0 centre (120.253, 172.6619) radius 1.35 projected
  circle A1 centre (190.353, 172.6619) radius 1.35 projected
  circle A2 centre (100.153, 172.6619) radius 1.35 projected
  circle A3 centre (210.453, 172.6619) radius 1.35 projected
  circle A4 centre (127.503, 111.6619) radius 1.35 projected
  circle A5 centre (92.903, 111.6619) radius 1.35 projected
  circle A6 centre (92.903, 133.6619) radius 1.35 projected
  circle A7 centre (217.703, 111.6619) radius 1.35 projected
  circle A8 centre (217.703, 133.6619) radius 1.35 projected
  circle A9 centre (183.103, 111.6619) radius 1.35 projected
  circle A10 centre (183.103, 133.6619) radius 1.35 projected
  circle A11 centre (127.503, 133.6619) radius 1.35 projected
  circle A12 centre (105.203, 175.6619) radius 0.75
  circle A13 centre (105.203, 169.6619) radius 0.75
  circle A14 centre (115.203, 169.6619) radius 0.75
  circle A15 centre (115.203, 175.6619) radius 0.75
  line L24 (195.403, 175.6619) -> (115.203, 175.6619) projected
  circle A16 centre (195.403, 175.6619) radius 0.75
  circle A17 centre (205.403, 175.6619) radius 0.75
  line L25 (205.403, 175.6619) -> (205.403, 169.6619) projected
  circle A18 centre (205.403, 169.6619) radius 0.75
  circle A19 centre (195.403, 169.6619) radius 0.75
  point P0 (0, 0)
  dimension "d38" = 1.5
  dimension "d39" = 1.5
  dimension "d40" = 1.5
  dimension "d41" = 1.5
  dimension "d42" = 1.5
  dimension "d43" = 1.5
  dimension "d44" = 1.5
  dimension "d45" = 1.5
extrude "돌출5" cut sketch "스케치4" against normal blind 6 contours L23 A19 L0 | L0 A19 L23 | A16 L1 L0 | L0 L1 A16 | A18 L22 L23 | L23 L22 A18 | A15 L2 L1 | L1 L2 A15 | A17 L21 L22 | L22 L21 A17 | A14 L3 L2 | L2 L3 A14 | A13 L4 L3 | L3 L4 A13 | A12 L5 L4 | L4 L5 A12
properties part number "frame_pelvis_to_waist2" material "PMMA 플라스틱"
